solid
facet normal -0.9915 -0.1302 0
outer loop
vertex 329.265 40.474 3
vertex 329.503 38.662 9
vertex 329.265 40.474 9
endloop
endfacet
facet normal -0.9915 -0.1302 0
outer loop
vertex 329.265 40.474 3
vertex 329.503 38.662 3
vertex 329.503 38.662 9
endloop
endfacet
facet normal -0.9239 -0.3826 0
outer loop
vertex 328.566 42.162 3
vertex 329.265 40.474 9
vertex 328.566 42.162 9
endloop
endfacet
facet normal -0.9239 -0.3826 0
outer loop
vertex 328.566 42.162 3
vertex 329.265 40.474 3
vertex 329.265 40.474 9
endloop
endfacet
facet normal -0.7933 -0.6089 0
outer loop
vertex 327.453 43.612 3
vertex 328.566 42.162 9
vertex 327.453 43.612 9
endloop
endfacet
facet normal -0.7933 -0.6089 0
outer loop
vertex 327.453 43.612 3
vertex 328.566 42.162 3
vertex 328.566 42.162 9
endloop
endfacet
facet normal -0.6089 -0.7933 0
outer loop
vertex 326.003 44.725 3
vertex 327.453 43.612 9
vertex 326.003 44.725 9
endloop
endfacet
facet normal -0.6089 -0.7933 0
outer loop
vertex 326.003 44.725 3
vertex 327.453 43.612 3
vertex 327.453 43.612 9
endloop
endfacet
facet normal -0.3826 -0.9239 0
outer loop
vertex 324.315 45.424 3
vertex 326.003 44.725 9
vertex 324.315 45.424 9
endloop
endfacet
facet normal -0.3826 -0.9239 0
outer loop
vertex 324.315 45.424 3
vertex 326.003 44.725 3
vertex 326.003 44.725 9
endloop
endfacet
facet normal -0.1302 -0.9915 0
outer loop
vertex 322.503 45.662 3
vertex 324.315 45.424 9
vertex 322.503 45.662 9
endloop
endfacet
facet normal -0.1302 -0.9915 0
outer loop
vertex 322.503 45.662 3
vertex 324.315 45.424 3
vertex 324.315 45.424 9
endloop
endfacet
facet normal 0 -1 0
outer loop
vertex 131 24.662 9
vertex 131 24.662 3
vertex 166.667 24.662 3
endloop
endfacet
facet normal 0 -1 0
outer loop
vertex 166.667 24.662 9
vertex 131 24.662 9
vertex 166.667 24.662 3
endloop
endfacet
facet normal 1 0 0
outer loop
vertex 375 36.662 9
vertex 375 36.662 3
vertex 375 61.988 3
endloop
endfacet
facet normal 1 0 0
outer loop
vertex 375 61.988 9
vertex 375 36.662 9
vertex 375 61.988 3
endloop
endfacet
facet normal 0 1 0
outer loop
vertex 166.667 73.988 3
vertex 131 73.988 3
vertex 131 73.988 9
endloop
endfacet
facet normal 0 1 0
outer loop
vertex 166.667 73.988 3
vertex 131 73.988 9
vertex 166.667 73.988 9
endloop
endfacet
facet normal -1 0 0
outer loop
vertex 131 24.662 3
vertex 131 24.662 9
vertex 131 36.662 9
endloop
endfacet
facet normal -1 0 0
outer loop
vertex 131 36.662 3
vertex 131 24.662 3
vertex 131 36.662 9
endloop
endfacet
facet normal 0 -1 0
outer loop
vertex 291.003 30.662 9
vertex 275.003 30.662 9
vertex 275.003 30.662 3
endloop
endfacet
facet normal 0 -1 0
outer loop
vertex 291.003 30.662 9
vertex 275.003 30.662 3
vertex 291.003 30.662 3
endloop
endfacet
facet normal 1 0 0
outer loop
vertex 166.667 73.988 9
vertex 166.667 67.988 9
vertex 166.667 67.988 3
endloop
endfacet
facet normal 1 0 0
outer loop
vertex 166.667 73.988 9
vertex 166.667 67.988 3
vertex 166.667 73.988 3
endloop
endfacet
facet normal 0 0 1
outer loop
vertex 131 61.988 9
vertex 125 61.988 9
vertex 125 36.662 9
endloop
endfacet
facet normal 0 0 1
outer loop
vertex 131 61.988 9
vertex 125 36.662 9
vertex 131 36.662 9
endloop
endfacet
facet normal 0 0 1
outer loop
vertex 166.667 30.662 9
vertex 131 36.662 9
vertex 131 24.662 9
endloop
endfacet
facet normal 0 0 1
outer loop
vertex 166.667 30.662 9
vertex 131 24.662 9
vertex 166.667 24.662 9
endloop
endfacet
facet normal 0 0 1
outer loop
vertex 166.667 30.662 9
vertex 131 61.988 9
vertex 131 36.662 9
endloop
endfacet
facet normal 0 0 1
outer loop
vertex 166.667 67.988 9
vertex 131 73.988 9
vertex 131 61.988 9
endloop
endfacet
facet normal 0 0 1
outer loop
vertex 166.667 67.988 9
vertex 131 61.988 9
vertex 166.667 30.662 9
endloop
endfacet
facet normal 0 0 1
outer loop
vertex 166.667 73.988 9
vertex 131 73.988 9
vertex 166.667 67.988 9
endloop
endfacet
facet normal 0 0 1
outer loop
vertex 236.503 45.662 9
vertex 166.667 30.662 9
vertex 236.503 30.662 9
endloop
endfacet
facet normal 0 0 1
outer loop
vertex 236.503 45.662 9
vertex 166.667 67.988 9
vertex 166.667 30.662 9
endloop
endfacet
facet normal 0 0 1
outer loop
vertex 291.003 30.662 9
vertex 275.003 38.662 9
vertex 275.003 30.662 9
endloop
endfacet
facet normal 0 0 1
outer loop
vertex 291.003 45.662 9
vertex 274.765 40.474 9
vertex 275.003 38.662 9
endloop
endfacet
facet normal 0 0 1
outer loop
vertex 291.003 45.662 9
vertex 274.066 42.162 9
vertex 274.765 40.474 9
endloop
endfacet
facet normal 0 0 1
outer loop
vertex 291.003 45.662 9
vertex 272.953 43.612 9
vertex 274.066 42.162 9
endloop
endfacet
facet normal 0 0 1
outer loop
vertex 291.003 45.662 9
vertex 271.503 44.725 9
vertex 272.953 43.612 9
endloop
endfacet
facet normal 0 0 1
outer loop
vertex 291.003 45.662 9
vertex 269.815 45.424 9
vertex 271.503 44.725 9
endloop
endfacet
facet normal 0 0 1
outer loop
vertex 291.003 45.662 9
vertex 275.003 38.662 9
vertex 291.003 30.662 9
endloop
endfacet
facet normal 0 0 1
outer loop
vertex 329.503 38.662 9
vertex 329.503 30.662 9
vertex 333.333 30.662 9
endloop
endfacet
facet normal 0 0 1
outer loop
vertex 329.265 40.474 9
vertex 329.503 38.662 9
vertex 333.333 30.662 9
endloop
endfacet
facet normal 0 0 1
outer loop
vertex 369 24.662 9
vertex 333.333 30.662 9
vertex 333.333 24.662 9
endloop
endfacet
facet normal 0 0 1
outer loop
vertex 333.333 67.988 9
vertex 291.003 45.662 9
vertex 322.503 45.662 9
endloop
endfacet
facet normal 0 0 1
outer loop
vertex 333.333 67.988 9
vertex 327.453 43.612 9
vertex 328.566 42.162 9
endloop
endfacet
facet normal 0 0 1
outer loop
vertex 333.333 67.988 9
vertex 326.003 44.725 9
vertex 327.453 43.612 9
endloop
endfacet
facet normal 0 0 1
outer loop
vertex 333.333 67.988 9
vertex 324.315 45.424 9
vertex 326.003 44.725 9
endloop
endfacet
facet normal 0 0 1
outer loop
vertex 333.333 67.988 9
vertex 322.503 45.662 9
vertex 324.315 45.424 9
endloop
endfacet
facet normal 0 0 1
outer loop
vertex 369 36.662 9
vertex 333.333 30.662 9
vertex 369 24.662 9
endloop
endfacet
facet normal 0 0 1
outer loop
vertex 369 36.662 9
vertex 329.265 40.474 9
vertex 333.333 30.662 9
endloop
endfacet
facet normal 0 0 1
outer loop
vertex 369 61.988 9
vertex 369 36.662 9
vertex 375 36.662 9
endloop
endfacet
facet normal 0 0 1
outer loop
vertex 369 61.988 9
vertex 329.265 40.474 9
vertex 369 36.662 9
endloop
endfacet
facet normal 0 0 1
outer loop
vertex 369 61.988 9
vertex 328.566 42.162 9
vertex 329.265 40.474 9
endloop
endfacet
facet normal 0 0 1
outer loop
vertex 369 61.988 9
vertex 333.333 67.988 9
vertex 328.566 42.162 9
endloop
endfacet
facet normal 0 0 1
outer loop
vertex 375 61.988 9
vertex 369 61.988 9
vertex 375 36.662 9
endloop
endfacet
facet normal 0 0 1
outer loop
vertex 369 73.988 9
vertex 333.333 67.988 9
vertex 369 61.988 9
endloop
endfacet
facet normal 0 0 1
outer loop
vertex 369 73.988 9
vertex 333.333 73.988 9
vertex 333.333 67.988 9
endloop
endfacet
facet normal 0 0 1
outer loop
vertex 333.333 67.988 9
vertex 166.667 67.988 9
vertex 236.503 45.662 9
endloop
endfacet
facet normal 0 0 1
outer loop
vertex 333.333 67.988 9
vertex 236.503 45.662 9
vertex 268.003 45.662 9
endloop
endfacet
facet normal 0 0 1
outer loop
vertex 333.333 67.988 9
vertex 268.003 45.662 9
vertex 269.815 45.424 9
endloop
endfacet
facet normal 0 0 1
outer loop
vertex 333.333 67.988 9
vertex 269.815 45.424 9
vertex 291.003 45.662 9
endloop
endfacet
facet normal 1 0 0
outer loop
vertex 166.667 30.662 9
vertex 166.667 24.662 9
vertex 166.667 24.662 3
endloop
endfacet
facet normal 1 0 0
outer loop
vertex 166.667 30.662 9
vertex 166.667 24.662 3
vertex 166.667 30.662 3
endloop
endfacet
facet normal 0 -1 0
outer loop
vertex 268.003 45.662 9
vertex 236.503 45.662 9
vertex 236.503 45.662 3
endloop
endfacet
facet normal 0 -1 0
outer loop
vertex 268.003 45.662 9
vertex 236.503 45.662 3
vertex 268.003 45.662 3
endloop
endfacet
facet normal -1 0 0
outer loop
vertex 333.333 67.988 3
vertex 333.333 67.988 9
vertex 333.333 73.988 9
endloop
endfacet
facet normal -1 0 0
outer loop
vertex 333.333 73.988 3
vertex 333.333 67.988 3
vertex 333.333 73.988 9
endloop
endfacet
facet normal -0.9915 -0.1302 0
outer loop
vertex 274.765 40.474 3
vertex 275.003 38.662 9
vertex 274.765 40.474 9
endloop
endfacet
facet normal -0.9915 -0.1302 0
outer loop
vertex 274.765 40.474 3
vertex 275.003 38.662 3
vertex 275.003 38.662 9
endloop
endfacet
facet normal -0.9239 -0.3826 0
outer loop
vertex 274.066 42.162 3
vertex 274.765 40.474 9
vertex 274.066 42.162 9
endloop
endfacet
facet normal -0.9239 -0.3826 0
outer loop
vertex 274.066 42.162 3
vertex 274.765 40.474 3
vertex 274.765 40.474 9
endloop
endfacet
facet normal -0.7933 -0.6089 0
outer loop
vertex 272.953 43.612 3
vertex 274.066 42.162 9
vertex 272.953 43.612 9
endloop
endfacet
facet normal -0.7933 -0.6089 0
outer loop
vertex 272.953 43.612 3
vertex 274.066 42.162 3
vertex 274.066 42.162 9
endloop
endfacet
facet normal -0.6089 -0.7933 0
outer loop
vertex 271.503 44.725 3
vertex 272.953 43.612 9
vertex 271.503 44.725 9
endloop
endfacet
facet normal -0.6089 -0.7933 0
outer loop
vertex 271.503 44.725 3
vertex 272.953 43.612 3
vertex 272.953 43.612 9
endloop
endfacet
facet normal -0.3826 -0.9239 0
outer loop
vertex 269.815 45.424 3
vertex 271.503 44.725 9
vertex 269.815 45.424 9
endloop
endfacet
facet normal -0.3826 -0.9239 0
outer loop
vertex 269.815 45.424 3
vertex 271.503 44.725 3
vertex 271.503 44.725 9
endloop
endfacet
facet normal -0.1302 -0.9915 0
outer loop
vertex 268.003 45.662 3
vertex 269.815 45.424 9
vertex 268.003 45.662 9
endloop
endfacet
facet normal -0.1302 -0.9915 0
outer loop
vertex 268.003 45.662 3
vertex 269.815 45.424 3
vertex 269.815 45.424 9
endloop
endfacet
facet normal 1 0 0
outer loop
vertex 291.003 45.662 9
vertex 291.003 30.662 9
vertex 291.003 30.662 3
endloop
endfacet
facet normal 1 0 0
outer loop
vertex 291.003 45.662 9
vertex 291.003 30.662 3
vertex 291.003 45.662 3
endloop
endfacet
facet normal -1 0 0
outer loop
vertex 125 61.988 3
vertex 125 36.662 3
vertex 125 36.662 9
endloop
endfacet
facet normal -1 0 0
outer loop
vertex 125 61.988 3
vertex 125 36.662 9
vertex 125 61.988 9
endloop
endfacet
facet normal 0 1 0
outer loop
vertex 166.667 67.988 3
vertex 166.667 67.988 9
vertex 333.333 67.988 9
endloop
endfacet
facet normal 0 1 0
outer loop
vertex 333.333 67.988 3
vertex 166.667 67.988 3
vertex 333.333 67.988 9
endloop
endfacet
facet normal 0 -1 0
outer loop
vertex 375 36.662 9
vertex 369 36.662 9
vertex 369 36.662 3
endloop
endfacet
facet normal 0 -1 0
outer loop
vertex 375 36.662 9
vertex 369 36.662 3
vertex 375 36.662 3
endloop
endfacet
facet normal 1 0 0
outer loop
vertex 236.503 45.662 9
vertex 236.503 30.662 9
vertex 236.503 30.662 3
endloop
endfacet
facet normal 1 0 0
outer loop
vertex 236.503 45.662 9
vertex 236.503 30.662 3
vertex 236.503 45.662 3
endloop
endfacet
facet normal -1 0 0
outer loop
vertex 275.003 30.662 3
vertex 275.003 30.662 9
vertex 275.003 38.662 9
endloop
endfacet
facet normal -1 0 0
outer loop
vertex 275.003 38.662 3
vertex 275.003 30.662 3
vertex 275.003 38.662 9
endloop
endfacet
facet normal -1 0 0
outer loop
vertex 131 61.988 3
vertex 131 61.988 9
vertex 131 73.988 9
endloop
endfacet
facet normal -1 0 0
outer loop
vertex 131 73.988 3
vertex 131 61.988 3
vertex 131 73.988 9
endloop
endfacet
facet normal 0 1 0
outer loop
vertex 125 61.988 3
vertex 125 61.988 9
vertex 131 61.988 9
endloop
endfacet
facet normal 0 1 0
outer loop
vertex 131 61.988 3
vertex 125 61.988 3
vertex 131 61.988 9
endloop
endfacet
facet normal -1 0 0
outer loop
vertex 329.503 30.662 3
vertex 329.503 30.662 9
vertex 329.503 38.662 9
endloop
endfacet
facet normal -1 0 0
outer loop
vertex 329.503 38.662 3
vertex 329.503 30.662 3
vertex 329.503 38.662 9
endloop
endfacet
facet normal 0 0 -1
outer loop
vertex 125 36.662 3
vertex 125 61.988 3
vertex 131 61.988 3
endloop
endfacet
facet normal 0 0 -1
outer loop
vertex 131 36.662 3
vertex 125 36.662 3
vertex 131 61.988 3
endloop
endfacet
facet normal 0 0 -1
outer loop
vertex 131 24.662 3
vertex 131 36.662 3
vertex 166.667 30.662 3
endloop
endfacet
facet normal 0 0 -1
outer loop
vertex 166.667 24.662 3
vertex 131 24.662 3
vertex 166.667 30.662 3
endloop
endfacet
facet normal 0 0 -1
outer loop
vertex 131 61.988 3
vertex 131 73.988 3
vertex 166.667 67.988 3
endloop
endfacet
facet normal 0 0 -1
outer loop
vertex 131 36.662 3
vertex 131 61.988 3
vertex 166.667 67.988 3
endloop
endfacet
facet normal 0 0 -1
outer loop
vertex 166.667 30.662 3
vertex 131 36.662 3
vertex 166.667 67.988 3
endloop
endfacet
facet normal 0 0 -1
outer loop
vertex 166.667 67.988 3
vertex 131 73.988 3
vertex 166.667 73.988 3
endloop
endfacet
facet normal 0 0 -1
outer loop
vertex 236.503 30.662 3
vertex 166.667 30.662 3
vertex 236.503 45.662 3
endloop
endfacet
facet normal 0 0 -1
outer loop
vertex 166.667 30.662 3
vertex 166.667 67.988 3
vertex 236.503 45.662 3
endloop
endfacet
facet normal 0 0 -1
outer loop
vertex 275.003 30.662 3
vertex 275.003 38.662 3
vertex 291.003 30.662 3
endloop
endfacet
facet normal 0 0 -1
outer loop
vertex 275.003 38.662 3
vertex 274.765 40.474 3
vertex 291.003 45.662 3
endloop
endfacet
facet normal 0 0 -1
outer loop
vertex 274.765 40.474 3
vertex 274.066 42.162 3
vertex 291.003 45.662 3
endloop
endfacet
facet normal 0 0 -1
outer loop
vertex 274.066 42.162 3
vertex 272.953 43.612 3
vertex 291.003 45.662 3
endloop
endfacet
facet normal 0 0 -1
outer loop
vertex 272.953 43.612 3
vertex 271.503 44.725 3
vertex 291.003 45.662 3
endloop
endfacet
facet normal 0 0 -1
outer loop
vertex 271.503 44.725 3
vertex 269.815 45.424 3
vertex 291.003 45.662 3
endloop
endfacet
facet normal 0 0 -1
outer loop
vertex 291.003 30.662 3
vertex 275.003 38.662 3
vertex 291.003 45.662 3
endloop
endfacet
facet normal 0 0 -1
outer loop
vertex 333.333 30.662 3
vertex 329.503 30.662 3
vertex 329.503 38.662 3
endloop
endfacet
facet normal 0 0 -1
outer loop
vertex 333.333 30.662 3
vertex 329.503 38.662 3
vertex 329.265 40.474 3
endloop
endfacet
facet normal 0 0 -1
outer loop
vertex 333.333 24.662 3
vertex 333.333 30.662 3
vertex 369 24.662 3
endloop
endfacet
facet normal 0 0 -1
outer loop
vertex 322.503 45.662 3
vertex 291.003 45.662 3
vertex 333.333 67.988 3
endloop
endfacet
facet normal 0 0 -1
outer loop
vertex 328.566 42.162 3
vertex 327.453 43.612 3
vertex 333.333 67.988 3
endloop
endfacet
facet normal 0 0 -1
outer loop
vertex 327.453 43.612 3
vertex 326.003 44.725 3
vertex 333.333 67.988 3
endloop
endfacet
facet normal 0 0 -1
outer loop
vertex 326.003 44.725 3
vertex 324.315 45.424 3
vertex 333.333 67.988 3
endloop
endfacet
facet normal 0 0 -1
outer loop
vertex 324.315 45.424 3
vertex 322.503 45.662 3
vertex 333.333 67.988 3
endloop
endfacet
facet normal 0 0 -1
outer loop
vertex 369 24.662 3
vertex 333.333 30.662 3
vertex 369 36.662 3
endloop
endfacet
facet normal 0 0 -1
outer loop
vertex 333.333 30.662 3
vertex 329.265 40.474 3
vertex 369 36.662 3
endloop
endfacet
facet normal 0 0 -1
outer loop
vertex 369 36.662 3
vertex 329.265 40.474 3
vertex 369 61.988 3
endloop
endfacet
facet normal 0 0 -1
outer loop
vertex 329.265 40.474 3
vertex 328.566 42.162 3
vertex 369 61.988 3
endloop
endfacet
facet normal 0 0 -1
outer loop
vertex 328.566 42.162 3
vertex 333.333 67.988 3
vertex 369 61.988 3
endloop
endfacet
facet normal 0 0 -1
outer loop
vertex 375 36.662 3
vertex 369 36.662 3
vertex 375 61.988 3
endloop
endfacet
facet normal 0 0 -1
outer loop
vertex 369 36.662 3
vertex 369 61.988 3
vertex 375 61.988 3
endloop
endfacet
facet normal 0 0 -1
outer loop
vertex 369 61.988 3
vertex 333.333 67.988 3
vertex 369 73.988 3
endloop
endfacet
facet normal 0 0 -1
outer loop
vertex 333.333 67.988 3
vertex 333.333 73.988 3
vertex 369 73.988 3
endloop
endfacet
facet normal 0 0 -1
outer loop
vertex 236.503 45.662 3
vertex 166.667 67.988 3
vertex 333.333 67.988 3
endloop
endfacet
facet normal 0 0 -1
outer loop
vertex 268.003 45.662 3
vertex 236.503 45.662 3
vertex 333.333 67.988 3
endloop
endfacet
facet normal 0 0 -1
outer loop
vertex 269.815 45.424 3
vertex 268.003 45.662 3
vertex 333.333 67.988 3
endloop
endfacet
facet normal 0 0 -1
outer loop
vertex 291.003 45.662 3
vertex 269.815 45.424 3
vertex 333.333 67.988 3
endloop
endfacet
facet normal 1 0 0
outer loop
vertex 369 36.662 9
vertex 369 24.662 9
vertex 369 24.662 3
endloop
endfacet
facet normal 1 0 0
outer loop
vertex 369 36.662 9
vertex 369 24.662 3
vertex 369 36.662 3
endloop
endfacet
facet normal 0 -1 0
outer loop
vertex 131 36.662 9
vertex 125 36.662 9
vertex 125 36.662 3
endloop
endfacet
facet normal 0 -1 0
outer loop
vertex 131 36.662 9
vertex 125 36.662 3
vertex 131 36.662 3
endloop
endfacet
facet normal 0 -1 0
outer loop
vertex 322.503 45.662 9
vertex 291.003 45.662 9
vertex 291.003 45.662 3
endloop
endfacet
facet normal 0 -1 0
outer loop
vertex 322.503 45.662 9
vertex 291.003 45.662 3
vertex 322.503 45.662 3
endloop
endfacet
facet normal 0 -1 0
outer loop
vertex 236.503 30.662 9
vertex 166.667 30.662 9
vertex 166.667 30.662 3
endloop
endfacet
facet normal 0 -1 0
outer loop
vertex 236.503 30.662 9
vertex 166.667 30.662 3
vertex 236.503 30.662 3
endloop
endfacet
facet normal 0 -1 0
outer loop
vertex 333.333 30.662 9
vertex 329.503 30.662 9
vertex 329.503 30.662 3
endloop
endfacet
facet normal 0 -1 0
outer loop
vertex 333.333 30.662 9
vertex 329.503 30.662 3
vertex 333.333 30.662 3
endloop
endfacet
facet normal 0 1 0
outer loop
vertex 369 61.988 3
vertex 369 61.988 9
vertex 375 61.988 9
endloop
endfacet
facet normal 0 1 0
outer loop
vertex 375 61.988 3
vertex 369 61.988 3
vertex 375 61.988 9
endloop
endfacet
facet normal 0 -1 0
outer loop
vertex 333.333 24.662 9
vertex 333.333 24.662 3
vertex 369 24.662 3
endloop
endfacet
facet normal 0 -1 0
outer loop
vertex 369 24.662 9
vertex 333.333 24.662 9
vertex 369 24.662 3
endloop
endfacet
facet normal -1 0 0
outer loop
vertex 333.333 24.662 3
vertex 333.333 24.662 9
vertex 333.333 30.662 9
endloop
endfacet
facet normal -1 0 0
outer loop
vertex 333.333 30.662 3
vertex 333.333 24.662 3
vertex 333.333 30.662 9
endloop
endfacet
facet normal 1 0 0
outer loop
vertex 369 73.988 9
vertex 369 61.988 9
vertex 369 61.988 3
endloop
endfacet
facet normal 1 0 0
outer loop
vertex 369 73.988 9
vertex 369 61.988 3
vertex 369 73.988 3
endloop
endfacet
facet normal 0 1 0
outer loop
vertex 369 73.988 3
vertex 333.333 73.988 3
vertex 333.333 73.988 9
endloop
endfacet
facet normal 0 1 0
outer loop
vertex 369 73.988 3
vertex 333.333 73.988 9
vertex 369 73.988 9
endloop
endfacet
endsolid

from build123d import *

# Parameters (mm, degrees)
SKETCH1_W           = 500
SKETCH1_H           = 98.65
BOSS_EXTRUDE1_DEPTH = 12
SKETCH2_W           = 12
SKETCH2_H           = 24
SKETCH2_W_2         = 333.333333334
SKETCH2_H_2         = 12
CUT_EXTRUDE1_DEPTH  = 510.78017076
SCALE1_SCALE        = 0.5
SKETCH3_W           = 38.5
SKETCH3_H           = 15
CUT_EXTRUDE2_DEPTH  = 383.276274645
FILLET1_R           = 7


with BuildPart() as part:
    # Sketch1 → Boss-Extrude1 (new body)
    with BuildSketch(Plane.XY):
        with Locations((250, 49.325)):
            Rectangle(SKETCH1_W, SKETCH1_H)
    extrude(amount=BOSS_EXTRUDE1_DEPTH)

    # Sketch2 → Cut-Extrude1 (cut, through all)
    with BuildSketch(Plane.XY.offset(12)):
        with Locations((494, 86.65)):
            Rectangle(SKETCH2_W, SKETCH2_H)
        with Locations((494, 12)):
            Rectangle(SKETCH2_W, SKETCH2_H)
        with Locations((6, 12)):
            Rectangle(SKETCH2_W, SKETCH2_H)
        with Locations((6, 86.65)):
            Rectangle(SKETCH2_W, SKETCH2_H)
        with Locations((250, 92.65)):
            Rectangle(SKETCH2_W_2, SKETCH2_H_2)
        with Locations((250, 6)):
            Rectangle(SKETCH2_W_2, SKETCH2_H_2)
    extrude(amount=-CUT_EXTRUDE1_DEPTH, mode=Mode.SUBTRACT)


with BuildPart() as part_1:
    # Scale1: scaled about (250, 49.325, 6)
    add(part.part.scale(SCALE1_SCALE).moved(Location((125, 24.6625, 3))))

    # Sketch3 → Cut-Extrude2 (cut, through all)
    with BuildSketch(Plane.XY.offset(9)):
        with Locations((310.253333333, 38.1625)):
            Rectangle(SKETCH3_W, SKETCH3_H)
        with Locations((255.753333333, 38.1625)):
            Rectangle(SKETCH3_W, SKETCH3_H)
    extrude(amount=-CUT_EXTRUDE2_DEPTH, mode=Mode.SUBTRACT)

    # Fillet1
    fillet1_edges = [part_1.edges().sort_by_distance(p)[0] for p in [
        (329.503333333, 45.6625, 6),
        (275.003333333, 45.6625, 6),
    ]]
    fillet(fillet1_edges, radius=FILLET1_R)


solid = part_1.part
